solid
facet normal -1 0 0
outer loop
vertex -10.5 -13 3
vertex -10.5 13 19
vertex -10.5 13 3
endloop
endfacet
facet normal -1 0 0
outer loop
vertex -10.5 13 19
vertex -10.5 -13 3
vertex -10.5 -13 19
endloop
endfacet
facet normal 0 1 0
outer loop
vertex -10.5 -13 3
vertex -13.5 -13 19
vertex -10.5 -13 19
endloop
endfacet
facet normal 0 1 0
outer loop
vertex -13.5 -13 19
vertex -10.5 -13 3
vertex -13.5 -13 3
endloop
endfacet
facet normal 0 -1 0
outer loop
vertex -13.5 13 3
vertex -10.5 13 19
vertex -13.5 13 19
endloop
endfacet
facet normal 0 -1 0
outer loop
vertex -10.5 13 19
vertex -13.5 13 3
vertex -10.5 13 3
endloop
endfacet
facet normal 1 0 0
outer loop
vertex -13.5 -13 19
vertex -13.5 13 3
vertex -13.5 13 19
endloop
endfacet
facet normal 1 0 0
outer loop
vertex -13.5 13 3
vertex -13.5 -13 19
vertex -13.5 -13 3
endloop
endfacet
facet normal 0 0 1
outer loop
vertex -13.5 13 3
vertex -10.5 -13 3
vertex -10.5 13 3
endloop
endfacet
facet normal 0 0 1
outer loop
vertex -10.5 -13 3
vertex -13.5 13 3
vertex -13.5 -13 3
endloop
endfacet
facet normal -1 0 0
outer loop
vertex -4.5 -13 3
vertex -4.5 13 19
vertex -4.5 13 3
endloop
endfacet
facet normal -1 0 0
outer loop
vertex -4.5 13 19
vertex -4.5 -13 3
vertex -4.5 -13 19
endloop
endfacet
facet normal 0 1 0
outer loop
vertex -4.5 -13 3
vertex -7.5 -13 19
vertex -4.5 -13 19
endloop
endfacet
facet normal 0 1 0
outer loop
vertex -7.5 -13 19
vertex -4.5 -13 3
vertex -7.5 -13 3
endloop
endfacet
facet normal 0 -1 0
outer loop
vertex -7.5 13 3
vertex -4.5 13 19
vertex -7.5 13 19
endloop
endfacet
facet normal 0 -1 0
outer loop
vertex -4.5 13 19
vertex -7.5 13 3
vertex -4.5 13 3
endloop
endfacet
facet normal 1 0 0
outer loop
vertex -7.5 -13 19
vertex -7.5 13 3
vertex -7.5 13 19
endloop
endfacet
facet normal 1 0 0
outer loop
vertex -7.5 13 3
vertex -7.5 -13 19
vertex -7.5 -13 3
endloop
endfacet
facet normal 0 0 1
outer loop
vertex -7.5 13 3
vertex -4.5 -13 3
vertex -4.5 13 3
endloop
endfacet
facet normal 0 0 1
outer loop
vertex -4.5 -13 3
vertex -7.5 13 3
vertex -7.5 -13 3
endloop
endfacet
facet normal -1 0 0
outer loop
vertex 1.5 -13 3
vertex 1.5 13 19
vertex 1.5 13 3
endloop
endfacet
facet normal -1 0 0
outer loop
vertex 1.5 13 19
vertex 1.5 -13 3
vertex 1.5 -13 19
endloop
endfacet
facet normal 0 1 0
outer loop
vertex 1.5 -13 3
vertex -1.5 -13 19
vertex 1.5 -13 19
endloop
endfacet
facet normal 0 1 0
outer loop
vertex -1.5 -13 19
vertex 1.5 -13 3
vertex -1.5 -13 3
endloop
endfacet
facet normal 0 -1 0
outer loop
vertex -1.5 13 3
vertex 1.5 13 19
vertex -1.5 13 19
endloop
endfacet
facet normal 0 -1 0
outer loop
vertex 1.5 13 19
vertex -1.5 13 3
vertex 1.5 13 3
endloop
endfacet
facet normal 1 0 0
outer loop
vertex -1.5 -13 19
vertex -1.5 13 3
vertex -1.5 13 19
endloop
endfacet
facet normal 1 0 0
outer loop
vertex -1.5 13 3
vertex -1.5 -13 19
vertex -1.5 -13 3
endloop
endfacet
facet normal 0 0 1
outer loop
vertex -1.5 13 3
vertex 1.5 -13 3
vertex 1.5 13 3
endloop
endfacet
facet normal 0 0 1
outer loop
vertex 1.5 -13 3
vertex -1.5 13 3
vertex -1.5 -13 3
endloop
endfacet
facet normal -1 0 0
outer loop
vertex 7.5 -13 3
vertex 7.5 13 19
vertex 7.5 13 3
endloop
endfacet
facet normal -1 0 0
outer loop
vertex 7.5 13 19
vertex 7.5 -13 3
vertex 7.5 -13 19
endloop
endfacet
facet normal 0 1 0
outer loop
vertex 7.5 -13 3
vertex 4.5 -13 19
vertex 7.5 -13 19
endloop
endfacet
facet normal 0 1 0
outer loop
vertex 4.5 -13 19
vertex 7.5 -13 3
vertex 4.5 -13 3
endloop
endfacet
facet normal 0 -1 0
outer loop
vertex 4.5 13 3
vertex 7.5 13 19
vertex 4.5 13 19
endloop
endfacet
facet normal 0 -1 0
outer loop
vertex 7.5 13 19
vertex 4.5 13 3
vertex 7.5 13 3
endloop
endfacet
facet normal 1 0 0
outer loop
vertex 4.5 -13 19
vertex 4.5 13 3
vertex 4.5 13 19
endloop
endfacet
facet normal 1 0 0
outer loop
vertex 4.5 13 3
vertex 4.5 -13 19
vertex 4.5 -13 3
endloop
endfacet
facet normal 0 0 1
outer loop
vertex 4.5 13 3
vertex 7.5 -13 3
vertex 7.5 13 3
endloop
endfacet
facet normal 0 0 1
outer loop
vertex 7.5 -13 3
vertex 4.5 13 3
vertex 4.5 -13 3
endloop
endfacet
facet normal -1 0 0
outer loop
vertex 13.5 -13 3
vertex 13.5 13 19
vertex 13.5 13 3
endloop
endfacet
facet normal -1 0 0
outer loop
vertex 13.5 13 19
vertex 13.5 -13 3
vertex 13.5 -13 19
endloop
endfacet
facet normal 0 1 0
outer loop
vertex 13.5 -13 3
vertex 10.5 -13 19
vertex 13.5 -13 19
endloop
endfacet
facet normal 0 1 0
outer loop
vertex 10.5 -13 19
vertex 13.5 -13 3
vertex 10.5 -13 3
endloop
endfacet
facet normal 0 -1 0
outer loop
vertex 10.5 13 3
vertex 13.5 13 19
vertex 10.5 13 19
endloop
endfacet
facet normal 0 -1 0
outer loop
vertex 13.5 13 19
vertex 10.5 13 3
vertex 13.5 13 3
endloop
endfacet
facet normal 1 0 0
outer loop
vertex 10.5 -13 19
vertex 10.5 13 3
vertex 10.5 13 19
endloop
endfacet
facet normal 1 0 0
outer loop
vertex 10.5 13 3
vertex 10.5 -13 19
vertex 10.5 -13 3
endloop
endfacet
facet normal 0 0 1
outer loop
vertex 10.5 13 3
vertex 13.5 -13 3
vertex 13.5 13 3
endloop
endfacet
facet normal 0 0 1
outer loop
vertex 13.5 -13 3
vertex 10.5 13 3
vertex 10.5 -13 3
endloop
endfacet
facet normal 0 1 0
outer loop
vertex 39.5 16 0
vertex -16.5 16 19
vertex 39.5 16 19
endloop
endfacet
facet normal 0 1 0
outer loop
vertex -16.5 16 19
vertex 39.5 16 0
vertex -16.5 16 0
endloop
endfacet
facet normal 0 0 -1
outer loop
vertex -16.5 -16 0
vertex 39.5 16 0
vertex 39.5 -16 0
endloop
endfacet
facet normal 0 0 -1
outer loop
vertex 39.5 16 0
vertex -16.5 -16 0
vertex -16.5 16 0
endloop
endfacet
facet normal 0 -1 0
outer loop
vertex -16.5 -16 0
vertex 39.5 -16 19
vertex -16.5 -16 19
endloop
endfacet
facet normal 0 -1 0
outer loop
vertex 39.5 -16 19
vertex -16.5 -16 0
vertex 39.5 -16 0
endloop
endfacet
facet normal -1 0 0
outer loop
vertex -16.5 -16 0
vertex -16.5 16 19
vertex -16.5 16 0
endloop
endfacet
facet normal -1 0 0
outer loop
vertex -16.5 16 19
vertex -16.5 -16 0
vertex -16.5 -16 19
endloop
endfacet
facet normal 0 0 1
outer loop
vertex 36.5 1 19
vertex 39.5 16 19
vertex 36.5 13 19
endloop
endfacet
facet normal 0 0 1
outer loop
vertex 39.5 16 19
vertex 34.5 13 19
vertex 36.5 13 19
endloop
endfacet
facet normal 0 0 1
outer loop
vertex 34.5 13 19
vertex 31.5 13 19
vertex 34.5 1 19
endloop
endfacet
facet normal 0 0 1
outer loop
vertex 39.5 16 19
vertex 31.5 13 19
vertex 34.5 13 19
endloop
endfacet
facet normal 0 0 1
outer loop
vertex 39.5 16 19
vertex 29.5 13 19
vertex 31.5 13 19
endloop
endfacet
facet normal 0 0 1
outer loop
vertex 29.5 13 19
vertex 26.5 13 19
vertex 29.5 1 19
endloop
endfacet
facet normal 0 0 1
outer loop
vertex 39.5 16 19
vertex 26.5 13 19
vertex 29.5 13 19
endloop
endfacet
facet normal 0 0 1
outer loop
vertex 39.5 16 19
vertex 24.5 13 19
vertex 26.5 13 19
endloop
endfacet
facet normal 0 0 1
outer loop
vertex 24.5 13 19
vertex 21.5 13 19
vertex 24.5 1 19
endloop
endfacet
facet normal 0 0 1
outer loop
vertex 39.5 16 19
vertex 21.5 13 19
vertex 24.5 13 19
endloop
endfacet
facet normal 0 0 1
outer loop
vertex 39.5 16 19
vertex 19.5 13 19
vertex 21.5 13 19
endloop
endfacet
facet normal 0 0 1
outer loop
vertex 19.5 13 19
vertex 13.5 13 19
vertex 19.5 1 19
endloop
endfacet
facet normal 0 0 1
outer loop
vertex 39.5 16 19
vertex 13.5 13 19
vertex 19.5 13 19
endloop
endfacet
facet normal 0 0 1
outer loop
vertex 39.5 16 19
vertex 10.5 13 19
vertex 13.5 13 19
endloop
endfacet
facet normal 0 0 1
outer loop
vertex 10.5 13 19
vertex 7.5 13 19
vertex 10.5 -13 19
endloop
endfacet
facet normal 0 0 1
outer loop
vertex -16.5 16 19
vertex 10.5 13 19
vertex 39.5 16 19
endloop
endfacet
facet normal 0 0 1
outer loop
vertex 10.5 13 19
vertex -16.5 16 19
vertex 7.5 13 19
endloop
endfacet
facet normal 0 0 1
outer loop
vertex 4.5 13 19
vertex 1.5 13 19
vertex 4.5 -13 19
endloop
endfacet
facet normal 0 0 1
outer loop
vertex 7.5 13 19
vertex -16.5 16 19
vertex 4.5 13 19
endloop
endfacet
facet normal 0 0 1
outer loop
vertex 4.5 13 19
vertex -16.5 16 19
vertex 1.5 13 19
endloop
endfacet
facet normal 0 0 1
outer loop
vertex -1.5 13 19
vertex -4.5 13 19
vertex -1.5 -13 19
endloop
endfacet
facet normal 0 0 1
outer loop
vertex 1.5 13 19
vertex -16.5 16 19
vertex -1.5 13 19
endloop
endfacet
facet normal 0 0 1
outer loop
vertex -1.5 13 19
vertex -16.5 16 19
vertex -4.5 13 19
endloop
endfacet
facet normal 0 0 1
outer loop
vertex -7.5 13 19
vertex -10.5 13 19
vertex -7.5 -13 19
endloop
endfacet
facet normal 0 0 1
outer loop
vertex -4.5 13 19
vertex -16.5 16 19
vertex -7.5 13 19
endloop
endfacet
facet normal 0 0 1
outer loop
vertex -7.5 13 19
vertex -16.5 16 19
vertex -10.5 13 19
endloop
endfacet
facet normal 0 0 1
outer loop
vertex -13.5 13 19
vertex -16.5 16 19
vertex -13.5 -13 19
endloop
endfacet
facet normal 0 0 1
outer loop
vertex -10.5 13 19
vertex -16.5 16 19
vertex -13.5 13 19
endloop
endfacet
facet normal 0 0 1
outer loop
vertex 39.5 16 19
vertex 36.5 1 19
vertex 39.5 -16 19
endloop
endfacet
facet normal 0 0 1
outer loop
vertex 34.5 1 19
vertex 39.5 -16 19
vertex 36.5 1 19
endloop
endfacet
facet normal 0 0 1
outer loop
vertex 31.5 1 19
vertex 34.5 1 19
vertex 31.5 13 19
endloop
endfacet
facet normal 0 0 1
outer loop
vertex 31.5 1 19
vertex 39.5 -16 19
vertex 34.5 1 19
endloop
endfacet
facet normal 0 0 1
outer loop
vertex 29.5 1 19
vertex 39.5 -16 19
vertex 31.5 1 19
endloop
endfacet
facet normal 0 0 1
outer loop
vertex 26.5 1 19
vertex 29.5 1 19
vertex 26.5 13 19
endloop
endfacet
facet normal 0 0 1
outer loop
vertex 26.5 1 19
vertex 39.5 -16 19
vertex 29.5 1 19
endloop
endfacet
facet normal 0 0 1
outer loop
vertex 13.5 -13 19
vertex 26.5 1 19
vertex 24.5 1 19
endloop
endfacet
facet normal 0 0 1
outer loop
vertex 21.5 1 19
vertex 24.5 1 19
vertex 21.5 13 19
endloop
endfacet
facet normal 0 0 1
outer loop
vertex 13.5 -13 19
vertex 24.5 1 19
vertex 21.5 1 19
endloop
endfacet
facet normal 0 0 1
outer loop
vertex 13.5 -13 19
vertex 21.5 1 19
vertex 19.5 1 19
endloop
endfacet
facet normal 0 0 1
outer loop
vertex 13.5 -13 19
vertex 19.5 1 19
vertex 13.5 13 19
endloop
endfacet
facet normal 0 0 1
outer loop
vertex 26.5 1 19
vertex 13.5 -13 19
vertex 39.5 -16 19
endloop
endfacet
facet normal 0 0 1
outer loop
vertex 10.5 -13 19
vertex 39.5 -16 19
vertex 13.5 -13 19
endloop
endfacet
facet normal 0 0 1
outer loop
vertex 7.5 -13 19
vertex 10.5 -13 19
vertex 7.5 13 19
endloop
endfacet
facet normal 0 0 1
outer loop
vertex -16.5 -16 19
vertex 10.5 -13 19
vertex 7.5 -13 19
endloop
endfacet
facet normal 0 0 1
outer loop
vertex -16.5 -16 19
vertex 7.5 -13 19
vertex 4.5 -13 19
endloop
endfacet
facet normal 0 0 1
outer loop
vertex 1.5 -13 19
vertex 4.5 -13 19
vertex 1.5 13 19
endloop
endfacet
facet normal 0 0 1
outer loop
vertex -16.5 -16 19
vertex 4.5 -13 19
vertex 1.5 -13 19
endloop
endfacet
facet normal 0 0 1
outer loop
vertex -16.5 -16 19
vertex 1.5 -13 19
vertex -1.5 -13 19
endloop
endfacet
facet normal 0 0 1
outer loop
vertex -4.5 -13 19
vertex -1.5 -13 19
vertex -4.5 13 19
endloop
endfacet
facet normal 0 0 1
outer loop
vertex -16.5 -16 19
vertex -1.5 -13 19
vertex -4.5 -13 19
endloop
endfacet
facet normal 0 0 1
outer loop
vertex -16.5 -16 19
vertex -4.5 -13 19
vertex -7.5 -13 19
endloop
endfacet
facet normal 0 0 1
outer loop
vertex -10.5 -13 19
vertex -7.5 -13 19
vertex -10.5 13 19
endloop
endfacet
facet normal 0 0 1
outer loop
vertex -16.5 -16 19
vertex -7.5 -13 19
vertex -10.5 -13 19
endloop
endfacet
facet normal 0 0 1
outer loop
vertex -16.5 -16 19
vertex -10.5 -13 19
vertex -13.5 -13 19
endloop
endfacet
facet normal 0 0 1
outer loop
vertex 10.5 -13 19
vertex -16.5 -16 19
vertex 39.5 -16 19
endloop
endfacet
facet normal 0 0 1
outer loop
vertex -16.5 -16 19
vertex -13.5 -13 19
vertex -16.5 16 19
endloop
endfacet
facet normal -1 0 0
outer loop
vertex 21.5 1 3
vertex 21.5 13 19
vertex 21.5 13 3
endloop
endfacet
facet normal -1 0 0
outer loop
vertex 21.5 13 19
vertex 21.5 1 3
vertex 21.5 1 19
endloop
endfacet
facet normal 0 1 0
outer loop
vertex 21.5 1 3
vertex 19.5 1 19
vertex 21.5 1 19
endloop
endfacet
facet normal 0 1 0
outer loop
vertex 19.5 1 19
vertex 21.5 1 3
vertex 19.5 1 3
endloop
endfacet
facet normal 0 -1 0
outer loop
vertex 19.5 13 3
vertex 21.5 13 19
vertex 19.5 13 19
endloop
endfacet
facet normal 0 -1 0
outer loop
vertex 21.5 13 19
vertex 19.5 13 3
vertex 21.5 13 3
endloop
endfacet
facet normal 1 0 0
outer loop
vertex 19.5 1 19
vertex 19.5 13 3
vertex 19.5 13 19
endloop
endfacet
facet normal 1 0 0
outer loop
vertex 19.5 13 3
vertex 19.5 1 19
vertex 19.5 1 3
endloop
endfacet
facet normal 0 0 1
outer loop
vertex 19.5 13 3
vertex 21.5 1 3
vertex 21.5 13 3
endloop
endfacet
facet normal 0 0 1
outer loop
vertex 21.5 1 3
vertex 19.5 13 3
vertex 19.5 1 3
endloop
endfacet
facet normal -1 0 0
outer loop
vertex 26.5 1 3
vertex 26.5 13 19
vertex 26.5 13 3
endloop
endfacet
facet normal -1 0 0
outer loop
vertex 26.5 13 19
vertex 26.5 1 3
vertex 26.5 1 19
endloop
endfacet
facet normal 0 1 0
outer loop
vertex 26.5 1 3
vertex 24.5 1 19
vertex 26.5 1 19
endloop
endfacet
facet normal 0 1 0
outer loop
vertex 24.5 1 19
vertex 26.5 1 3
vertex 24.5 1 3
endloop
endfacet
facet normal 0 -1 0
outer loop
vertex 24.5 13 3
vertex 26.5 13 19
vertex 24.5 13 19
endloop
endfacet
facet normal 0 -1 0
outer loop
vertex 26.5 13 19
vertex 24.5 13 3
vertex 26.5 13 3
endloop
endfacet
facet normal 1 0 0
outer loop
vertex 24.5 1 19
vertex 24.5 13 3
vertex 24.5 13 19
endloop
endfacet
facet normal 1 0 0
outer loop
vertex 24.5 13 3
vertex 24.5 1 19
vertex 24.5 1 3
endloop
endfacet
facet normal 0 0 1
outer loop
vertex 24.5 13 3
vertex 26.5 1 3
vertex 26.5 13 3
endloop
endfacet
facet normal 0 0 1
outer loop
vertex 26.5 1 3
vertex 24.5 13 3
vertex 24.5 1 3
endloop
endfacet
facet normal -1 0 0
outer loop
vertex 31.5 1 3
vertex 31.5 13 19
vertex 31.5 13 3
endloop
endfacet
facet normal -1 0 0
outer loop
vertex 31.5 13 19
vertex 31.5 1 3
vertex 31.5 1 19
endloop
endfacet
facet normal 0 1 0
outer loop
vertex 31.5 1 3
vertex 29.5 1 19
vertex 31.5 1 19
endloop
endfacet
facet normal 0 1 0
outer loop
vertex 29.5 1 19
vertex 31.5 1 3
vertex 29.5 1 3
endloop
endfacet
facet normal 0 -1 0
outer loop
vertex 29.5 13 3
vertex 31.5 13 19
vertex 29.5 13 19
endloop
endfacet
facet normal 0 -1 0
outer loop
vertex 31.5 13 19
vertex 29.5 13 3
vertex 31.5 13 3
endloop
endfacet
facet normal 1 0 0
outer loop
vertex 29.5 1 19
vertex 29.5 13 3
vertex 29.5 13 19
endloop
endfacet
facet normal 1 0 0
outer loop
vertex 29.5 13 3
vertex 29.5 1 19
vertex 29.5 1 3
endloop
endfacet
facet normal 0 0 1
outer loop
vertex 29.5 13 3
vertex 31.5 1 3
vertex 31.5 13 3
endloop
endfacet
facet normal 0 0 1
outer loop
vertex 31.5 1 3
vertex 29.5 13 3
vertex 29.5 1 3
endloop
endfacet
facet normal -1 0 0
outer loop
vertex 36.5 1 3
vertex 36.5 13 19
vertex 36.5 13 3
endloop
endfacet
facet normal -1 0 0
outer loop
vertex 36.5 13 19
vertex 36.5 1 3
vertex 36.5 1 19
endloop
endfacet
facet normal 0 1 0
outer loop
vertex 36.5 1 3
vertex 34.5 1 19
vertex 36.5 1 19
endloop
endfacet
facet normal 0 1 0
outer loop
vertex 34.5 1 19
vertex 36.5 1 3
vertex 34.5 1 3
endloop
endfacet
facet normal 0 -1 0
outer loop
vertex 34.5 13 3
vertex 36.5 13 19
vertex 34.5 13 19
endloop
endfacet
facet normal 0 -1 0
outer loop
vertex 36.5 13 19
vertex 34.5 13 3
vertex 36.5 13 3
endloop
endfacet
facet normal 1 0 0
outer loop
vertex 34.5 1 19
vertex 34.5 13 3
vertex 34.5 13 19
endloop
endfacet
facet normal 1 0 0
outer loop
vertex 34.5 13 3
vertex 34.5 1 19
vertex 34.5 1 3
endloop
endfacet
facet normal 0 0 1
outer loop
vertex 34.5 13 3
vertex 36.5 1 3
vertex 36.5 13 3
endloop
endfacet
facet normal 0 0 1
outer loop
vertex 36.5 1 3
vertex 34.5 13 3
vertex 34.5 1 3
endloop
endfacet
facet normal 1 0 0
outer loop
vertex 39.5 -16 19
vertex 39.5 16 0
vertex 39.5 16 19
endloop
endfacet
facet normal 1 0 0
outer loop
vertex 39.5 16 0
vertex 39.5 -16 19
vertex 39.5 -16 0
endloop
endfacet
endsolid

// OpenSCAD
slotBorder = 3; // border around slots

microsdSlots = 4;
microsdWidth = 12; // 11 wide
microsdThickness = 2; // 1 thick
microsdDepth = 8; // half of 15 high
microsdHolderDepth = slotBorder + microsdThickness*microsdSlots + slotBorder*microsdSlots;

sdhcSlots = 5;
sdhcWidth = 26; // 24
sdhcThickness = 3; // 2.1
sdhcDepth = 16; // half of 32
sdhcHolderDepth = slotBorder + sdhcThickness*sdhcSlots + slotBorder*sdhcSlots;

holderWidth = sdhcWidth + 2*slotBorder;
holderHeight = sdhcDepth + slotBorder;

// makes solid holder block
module basicBlock(holderDepth) {
    linear_extrude(height=holderWidth, convexity=2)
        polygon(points = [ [0, 0],
            [holderDepth, 0],
            [holderDepth, holderHeight],
            [0, holderHeight] ]);
}

// makes slot holes
module slots(width,thickness,numslots) {
    for (i = [0 : numslots-1]) {
        translate([i*(slotBorder+thickness), 0])
            translate([slotBorder, slotBorder,0])
                translate([0,0,slotBorder])
                    cube(size=[thickness, holderHeight, width]);
    }
}

// generate both parts
module SDCardHolder() {
    // sdhc
    translate([-sdhcHolderDepth/2,holderWidth/2,0])
        rotate([90,0,0])
            difference() {
                basicBlock(sdhcHolderDepth);
                slots(sdhcWidth, sdhcThickness, sdhcSlots);
            }

    // microsd
    translate([sdhcHolderDepth, 0, 0])
        translate([-sdhcHolderDepth/2,holderWidth/2,0])
            rotate([90,0,0])
            difference() {
                basicBlock(microsdHolderDepth);
                slots(microsdWidth, microsdThickness, microsdSlots);
            }
}

SDCardHolder();
